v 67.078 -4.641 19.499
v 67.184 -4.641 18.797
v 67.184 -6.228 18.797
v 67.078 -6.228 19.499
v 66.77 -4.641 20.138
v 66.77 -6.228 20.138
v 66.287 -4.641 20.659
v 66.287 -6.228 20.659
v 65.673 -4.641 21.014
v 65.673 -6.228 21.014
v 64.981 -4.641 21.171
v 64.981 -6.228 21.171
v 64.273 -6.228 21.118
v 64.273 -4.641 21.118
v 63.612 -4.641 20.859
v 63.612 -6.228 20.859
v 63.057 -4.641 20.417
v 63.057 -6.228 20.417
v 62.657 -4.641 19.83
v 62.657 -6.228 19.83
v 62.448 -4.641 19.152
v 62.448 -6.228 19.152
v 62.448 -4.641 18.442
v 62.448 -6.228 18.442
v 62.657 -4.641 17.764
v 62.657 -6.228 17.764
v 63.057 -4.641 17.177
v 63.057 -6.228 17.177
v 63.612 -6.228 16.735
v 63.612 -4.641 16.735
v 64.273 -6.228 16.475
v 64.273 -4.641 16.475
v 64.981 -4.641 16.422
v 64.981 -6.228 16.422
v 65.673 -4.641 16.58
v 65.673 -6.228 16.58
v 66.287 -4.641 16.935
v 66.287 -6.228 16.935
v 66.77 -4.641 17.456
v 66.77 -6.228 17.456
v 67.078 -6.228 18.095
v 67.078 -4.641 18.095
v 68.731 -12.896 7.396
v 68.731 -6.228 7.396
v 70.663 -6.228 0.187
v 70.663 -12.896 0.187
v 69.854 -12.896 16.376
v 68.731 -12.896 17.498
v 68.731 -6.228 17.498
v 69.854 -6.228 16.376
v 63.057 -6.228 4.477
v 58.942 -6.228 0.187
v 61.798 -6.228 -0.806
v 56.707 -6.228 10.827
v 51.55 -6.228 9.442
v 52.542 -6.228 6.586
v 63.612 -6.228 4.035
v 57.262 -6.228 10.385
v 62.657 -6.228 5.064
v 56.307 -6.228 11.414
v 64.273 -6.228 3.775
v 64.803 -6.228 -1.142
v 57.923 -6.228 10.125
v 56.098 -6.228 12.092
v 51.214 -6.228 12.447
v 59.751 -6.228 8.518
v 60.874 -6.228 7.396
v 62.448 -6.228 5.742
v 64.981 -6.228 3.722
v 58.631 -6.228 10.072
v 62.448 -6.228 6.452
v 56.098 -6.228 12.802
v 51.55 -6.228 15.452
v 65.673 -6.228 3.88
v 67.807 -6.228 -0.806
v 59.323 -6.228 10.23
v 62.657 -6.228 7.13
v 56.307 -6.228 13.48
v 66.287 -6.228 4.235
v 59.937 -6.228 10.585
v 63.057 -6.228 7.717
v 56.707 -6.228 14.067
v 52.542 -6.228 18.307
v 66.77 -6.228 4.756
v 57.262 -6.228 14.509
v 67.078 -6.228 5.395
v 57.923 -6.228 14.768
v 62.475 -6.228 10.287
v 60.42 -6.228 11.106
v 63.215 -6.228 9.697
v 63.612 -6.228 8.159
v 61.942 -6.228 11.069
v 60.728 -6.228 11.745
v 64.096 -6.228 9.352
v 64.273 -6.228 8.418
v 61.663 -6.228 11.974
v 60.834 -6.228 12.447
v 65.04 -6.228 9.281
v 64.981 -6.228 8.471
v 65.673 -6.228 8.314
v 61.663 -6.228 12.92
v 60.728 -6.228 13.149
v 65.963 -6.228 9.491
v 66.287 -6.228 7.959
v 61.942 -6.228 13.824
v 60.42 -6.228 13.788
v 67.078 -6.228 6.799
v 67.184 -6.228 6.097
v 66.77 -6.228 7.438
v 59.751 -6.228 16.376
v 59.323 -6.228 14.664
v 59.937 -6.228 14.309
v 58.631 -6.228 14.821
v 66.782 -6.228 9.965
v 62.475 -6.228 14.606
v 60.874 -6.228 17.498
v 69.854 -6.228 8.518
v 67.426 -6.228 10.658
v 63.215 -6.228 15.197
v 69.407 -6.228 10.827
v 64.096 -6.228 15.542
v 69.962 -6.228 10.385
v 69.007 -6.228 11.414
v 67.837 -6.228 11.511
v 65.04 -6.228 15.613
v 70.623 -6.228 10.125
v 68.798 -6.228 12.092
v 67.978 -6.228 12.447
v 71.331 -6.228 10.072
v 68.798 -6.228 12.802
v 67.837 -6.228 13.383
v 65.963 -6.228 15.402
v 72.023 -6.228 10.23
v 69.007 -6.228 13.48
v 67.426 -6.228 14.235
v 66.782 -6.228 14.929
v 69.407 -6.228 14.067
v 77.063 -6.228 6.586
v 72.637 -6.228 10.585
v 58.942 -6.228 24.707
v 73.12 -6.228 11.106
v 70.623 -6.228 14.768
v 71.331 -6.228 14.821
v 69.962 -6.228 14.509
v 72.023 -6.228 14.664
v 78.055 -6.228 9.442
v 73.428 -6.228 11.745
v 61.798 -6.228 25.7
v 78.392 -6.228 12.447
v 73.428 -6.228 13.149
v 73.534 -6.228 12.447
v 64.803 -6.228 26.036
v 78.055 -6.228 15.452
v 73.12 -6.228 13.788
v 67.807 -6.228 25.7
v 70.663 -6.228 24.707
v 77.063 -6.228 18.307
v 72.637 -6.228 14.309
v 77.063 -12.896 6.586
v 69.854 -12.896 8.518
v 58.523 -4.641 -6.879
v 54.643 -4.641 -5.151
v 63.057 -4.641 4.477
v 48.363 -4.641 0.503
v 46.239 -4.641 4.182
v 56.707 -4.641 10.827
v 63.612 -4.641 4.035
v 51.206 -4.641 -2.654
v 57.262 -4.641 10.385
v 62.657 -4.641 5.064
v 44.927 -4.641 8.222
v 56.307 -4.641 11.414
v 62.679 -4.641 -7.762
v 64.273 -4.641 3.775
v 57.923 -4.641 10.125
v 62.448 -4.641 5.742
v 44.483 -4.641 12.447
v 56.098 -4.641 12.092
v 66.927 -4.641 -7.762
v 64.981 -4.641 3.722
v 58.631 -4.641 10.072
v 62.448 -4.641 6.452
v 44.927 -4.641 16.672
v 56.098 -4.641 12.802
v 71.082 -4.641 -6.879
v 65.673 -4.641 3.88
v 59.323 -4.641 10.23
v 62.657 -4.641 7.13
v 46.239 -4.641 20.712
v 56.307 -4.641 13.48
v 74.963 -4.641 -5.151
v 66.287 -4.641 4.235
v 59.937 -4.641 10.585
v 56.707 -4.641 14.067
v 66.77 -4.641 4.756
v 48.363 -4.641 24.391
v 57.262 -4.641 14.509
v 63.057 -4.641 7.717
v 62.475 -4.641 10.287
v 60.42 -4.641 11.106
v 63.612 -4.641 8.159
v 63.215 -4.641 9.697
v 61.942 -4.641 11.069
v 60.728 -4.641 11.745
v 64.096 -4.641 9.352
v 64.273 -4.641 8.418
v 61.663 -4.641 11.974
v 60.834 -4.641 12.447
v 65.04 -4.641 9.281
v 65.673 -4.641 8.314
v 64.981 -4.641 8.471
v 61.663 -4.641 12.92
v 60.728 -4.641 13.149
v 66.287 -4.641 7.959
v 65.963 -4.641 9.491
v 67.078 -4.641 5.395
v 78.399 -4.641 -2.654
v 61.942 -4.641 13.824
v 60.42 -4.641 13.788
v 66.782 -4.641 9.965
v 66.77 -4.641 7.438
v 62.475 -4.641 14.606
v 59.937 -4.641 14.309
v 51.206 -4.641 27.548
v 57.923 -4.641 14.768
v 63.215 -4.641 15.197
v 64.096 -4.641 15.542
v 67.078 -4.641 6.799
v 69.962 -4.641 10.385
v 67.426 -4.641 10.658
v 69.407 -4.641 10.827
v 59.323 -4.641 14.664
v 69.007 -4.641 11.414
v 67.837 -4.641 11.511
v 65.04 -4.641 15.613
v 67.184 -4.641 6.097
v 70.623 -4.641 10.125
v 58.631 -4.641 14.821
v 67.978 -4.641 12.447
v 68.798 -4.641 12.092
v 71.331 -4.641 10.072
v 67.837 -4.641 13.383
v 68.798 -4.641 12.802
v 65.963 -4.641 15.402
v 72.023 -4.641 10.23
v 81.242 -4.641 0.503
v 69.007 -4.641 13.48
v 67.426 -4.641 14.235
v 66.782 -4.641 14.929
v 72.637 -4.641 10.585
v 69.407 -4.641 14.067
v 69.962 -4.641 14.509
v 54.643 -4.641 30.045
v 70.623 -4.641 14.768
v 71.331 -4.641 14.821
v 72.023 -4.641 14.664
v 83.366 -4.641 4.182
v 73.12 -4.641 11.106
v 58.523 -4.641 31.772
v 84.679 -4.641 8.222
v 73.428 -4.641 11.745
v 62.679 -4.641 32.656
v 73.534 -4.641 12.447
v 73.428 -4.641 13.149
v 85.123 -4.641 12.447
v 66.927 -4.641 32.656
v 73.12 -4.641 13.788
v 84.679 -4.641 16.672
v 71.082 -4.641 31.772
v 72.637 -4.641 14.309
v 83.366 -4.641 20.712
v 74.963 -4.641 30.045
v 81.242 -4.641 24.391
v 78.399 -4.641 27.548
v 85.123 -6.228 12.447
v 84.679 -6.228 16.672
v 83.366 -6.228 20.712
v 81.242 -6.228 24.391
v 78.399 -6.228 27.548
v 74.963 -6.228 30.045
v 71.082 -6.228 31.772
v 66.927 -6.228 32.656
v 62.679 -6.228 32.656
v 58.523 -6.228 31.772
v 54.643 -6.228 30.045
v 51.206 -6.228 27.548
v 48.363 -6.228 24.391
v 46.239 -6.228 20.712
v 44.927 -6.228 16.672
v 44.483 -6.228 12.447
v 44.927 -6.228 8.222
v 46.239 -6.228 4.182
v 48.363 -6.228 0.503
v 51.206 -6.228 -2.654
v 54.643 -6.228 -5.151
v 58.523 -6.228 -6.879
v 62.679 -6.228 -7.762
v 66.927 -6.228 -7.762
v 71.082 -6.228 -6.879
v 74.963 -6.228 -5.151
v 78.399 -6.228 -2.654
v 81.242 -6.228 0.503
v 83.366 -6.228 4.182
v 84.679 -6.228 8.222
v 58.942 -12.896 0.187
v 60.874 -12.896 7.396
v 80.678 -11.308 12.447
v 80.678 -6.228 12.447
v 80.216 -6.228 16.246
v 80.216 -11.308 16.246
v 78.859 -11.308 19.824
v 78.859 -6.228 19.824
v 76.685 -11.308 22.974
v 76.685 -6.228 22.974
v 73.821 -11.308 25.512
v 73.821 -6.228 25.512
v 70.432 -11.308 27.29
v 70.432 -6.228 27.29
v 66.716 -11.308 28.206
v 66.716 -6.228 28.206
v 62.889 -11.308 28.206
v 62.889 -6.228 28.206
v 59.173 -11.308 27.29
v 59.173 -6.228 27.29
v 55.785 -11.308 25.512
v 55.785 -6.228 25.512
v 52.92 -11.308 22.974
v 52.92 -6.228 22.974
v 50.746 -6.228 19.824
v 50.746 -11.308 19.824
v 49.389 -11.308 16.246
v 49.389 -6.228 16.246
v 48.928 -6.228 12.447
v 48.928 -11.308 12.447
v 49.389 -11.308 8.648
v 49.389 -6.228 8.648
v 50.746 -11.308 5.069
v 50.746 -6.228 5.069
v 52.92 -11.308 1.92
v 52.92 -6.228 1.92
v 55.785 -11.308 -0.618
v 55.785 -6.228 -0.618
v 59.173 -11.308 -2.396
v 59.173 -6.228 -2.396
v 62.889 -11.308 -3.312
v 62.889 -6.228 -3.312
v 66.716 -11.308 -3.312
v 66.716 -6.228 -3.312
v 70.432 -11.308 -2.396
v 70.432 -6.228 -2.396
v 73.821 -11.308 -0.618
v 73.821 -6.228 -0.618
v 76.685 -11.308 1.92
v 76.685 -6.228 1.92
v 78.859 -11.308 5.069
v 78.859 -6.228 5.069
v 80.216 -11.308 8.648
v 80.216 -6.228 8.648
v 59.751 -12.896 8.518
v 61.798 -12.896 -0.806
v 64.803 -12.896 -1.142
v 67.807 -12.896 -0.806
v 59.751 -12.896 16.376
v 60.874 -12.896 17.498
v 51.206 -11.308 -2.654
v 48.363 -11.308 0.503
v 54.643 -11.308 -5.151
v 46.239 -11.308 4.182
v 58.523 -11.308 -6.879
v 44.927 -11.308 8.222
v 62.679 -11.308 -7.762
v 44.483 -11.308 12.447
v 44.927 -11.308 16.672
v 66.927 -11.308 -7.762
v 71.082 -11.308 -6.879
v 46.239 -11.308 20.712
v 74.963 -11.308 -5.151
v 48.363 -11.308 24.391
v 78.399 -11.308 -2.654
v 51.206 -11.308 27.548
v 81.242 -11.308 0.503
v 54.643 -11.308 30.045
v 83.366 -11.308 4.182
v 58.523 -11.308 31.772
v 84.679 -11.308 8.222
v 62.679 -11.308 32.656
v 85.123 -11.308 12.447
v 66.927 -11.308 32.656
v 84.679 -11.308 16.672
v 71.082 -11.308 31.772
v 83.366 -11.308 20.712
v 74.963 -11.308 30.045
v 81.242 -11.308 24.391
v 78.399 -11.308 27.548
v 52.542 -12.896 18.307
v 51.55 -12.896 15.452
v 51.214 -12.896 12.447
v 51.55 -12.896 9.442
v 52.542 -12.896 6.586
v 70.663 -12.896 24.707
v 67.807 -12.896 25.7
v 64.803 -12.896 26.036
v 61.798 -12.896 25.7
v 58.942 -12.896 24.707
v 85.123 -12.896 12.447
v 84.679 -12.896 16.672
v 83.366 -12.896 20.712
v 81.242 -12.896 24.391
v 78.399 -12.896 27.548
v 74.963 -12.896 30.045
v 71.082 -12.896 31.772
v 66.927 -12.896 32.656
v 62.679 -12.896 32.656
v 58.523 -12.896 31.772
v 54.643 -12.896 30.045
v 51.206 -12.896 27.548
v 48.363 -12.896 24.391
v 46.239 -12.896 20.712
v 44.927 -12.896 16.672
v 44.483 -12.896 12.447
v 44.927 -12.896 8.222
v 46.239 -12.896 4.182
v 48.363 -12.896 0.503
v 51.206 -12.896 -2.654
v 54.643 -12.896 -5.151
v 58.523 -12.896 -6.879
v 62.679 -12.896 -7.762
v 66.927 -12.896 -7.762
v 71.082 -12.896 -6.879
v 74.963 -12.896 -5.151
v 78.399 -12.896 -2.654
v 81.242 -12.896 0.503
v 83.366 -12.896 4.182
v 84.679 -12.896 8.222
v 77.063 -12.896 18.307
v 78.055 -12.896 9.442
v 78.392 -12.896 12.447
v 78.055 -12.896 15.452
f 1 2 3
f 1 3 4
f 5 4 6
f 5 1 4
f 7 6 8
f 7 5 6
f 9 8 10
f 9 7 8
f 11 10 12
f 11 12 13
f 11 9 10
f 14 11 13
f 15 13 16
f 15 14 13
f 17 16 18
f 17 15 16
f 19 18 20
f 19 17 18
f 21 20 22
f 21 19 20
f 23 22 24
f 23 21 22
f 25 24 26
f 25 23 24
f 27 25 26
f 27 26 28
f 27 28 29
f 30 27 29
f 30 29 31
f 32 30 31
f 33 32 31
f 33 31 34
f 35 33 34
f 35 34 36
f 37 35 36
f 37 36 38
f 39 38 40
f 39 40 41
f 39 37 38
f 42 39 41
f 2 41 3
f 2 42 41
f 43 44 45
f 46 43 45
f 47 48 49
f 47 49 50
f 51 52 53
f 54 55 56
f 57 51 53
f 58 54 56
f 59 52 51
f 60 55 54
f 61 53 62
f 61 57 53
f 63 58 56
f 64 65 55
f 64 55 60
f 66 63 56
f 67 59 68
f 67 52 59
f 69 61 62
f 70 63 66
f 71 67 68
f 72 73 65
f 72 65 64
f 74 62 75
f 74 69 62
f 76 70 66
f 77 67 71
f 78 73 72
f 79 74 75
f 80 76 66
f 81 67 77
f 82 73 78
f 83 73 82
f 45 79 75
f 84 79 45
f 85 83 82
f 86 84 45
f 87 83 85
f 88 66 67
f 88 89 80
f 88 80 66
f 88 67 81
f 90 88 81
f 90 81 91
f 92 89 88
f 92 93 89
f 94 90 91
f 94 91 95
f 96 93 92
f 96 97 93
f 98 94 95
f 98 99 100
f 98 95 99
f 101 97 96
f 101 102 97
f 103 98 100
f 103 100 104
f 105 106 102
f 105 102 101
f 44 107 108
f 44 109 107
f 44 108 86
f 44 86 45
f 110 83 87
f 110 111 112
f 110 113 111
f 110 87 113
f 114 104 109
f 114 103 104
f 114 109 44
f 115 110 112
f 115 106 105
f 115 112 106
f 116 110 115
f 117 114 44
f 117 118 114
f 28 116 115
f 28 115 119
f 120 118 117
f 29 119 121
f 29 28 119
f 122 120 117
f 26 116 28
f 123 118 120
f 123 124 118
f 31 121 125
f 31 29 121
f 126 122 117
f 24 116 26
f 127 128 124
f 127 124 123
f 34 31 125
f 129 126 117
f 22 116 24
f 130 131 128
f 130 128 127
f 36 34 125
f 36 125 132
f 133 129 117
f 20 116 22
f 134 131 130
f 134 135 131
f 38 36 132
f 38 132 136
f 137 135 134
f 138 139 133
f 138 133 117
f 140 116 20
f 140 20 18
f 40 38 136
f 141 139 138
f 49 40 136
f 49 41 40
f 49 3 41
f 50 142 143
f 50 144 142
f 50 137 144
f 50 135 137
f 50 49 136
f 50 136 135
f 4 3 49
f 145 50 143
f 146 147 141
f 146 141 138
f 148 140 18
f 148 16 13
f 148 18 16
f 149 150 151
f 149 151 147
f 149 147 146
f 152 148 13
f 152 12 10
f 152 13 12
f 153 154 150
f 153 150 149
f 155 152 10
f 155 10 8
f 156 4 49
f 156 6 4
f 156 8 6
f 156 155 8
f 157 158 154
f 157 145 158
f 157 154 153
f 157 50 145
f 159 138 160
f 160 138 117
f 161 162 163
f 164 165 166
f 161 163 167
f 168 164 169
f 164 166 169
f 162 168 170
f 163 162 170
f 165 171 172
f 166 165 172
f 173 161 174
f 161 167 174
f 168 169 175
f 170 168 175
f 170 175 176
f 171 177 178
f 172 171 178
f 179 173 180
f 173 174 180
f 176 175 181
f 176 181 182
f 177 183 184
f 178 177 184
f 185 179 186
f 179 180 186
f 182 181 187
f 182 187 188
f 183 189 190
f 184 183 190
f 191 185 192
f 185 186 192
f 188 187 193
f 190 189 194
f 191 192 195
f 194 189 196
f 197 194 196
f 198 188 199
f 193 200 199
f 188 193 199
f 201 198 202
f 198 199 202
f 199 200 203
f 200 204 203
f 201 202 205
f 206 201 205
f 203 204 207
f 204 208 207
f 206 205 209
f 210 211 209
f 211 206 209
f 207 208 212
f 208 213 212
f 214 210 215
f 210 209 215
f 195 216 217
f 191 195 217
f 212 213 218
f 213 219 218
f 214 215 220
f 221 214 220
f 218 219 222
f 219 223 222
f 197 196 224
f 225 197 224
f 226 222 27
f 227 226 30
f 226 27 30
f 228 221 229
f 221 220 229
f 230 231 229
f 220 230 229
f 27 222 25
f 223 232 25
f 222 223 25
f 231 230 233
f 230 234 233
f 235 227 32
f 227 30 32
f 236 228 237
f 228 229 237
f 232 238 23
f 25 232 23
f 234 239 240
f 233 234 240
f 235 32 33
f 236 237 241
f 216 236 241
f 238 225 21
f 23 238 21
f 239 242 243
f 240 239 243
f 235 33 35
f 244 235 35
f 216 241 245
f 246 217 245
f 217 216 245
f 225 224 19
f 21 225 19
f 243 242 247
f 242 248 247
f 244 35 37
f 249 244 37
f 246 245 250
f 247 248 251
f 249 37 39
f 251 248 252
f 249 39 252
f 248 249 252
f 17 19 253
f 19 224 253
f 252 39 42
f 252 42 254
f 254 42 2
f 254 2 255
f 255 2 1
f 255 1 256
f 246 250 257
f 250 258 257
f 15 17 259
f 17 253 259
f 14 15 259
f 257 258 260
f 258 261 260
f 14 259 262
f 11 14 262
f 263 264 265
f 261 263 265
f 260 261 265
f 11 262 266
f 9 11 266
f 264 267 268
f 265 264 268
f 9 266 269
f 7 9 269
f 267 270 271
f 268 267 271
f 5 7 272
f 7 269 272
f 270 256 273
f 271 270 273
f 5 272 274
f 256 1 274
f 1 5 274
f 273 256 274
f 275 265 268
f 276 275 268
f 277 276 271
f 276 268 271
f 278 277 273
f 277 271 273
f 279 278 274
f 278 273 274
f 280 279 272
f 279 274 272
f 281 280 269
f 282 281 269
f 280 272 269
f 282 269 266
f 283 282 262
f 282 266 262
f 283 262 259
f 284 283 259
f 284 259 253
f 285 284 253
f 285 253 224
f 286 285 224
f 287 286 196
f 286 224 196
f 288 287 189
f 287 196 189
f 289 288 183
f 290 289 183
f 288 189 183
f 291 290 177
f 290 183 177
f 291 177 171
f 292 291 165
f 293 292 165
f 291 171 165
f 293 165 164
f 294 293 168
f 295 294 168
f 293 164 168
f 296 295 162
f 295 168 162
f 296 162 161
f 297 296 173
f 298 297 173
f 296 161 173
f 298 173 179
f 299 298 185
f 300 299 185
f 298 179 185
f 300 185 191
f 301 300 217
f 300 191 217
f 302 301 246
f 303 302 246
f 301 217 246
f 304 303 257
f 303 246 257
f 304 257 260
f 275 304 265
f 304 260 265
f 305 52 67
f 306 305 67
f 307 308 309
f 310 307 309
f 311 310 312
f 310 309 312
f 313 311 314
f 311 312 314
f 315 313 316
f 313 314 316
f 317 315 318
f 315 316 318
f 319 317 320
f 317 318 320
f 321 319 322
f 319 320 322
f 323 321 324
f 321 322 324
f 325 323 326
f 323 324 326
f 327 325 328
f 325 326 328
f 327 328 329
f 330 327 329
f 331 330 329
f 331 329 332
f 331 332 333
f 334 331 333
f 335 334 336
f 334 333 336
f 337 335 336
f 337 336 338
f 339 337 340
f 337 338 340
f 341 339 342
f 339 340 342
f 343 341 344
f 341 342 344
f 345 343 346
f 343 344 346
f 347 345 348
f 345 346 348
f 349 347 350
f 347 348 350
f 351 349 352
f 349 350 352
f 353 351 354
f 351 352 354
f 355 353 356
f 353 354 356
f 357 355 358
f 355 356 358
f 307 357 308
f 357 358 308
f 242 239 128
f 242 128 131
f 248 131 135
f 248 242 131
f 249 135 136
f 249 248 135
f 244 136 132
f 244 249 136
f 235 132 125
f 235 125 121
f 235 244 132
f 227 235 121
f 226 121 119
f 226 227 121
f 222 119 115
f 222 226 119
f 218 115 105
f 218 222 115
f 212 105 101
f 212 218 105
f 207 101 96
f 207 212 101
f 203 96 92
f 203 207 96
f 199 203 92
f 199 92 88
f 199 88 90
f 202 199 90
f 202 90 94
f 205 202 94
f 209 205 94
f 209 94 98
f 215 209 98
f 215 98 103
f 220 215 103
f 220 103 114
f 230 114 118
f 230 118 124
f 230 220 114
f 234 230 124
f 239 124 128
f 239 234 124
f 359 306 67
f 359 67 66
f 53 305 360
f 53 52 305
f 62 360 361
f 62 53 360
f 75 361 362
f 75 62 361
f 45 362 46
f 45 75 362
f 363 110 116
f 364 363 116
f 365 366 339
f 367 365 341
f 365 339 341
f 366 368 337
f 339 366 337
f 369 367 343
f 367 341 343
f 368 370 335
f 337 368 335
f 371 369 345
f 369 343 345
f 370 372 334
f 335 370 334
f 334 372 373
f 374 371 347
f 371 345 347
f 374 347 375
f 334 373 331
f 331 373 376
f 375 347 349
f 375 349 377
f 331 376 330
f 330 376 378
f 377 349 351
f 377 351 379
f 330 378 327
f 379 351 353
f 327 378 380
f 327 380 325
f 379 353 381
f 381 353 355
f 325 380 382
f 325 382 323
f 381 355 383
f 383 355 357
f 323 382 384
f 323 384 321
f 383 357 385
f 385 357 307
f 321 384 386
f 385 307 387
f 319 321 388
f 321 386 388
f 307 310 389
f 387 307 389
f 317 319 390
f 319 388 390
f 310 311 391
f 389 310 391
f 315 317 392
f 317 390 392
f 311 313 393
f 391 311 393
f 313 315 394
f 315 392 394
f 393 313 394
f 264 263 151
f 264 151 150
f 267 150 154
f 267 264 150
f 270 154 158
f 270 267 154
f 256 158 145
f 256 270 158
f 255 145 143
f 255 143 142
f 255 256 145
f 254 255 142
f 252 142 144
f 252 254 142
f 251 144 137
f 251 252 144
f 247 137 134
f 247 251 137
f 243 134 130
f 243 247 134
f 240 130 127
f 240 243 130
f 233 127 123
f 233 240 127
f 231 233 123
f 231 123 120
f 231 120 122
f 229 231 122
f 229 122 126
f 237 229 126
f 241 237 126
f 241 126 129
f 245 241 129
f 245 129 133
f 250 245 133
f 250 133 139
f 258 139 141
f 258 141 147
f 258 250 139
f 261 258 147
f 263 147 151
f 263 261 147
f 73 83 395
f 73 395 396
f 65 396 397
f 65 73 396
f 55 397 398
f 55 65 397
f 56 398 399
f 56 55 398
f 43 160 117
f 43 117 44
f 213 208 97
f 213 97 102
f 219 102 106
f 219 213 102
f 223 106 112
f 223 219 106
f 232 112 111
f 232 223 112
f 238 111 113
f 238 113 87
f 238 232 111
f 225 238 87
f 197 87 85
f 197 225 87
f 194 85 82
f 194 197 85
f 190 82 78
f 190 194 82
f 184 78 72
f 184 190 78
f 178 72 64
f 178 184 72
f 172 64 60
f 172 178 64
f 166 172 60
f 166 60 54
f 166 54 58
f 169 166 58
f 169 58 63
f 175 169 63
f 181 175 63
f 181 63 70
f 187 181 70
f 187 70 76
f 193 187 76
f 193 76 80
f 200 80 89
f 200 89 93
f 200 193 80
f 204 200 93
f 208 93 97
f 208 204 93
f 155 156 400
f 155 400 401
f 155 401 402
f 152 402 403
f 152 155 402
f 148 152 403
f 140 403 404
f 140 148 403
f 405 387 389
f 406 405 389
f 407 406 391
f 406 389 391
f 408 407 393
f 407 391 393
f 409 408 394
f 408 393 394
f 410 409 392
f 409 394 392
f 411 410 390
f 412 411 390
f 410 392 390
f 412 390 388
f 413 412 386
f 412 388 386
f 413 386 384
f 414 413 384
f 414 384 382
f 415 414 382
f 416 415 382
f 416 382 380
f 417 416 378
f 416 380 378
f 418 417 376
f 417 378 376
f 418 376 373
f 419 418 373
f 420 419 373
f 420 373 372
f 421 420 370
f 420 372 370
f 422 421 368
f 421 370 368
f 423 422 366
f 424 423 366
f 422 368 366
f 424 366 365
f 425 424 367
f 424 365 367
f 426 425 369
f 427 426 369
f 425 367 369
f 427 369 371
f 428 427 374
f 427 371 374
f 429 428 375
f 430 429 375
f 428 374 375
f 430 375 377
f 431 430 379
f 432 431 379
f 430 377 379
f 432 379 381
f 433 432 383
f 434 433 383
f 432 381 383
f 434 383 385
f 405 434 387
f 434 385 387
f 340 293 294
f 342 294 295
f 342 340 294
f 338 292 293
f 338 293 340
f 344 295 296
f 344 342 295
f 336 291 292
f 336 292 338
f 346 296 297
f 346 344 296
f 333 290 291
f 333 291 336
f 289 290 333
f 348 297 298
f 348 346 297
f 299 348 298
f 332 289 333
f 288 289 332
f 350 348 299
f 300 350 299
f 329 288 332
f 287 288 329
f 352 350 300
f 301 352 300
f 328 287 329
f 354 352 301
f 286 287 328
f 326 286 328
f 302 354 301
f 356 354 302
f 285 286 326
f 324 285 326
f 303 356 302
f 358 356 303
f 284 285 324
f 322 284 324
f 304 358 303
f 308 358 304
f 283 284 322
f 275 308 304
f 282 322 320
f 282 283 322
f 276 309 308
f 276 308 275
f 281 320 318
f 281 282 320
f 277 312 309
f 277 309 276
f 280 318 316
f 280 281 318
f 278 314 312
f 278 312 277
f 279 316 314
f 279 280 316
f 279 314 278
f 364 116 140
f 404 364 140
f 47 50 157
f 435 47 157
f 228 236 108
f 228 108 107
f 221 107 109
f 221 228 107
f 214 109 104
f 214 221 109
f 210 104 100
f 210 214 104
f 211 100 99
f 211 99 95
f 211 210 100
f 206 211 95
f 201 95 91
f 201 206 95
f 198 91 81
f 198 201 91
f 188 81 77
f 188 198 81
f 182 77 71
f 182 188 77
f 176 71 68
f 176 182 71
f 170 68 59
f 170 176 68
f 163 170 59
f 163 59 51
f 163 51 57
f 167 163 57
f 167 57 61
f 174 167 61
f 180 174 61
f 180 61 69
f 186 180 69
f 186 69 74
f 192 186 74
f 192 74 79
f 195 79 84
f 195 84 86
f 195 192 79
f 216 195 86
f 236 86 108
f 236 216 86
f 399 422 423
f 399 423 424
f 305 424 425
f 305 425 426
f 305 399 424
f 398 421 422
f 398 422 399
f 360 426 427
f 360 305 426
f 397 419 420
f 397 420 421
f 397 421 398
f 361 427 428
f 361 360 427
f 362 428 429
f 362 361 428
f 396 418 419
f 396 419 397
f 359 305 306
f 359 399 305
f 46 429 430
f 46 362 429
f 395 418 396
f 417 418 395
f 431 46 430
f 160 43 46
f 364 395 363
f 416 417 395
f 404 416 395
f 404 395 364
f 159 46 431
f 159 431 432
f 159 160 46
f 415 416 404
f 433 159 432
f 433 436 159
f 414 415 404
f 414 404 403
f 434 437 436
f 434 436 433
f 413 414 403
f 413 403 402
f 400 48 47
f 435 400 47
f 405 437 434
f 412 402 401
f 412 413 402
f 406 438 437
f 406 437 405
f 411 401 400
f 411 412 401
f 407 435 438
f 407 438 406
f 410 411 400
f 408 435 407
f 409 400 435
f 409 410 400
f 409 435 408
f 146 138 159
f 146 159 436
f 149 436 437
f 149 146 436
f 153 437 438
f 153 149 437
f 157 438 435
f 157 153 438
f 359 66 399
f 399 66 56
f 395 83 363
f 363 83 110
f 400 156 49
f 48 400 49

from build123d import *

# Parameters (mm, degrees)
SKETCH1_R           = 20.32
SKETCH1_R_2         = 3.175
SKETCH1_R_3         = 2.38125
BOSS_EXTRUDE1_DEPTH = 1.5875
SKETCH2_R           = 15.875
SKETCH2_R_2         = 13.589
BOSS_EXTRUDE2_DEPTH = 5.08
SKETCH3_R           = 20.32
SKETCH3_R_2         = 13.589
BOSS_EXTRUDE3_DEPTH = 1.5875
BOSS_EXTRUDE4_DEPTH = 6.6675


with BuildPart() as part:
    # Sketch1 → Boss-Extrude1 (new body)
    with BuildSketch(Plane.XZ.offset(4.640864108)):
        with Locations((64.802565284, 12.446906686)):
            Circle(SKETCH1_R)
        with Locations((64.802565284, 12.446906686)):
            Circle(SKETCH1_R_2, mode=Mode.SUBTRACT)
        with Locations((58.452565284, 12.446906686)):
            Circle(SKETCH1_R_3, mode=Mode.SUBTRACT)
        with Locations((71.152565284, 12.446906686)):
            Circle(SKETCH1_R_3, mode=Mode.SUBTRACT)
        with Locations((64.802565284, 18.796906686)):
            Circle(SKETCH1_R_3, mode=Mode.SUBTRACT)
        with Locations((64.802565284, 6.096906686)):
            Circle(SKETCH1_R_3, mode=Mode.SUBTRACT)
    extrude(amount=BOSS_EXTRUDE1_DEPTH)

    # Sketch2 → Boss-Extrude2 (add)
    with BuildSketch(Plane.XZ.offset(6.228364108)):
        with Locations((64.802565284, 12.446906686)):
            Circle(SKETCH2_R)
        with Locations((64.802565284, 12.446906686)):
            Circle(SKETCH2_R_2, mode=Mode.SUBTRACT)
    extrude(amount=BOSS_EXTRUDE2_DEPTH)

    # Sketch3 → Boss-Extrude3 (add)
    with BuildSketch(Plane.XZ.offset(11.308364108)):
        with Locations((64.802565284, 12.446906686)):
            Circle(SKETCH3_R)
        with Locations((64.802565284, 12.446906686)):
            Circle(SKETCH3_R_2, mode=Mode.SUBTRACT)
    extrude(amount=BOSS_EXTRUDE3_DEPTH)

    # Sketch4 → Boss-Extrude4 (add)
    with BuildSketch(Plane.XZ.offset(6.228364108)):
        with BuildLine():
            Line((52.542239657, 18.307396129), (59.751171216, 16.375768739))
            Line((59.751171216, 16.375768739), (60.873703231, 17.498300754))
            Line((60.873703231, 17.498300754), (58.942075841, 24.707232314))
            ThreePointArc((58.942075841, 24.707232314), (55.193691235, 22.055780736), (52.542239657, 18.307396129))
        make_face()
        with BuildLine():
            Line((70.663054727, 24.707232314), (68.731427337, 17.498300754))
            Line((68.731427337, 17.498300754), (69.853959352, 16.375768739))
            Line((69.853959352, 16.375768739), (77.062890912, 18.307396129))
            ThreePointArc((77.062890912, 18.307396129), (74.411439334, 22.055780736), (70.663054727, 24.707232314))
        make_face()
        with BuildLine():
            Line((77.062890912, 6.586417243), (69.853959352, 8.518044633))
            Line((69.853959352, 8.518044633), (68.731427337, 7.395512618))
            Line((68.731427337, 7.395512618), (70.663054727, 0.186581059))
            ThreePointArc((70.663054727, 0.186581059), (74.411439334, 2.838032636), (77.062890912, 6.586417243))
        make_face()
        with BuildLine():
            Line((58.942075841, 0.186581059), (60.873703231, 7.395512618))
            Line((60.873703231, 7.395512618), (59.751171216, 8.518044633))
            Line((59.751171216, 8.518044633), (52.542239657, 6.586417243))
            ThreePointArc((52.542239657, 6.586417243), (55.193691235, 2.838032636), (58.942075841, 0.186581059))
        make_face()
    extrude(amount=BOSS_EXTRUDE4_DEPTH)


solid = part.part
